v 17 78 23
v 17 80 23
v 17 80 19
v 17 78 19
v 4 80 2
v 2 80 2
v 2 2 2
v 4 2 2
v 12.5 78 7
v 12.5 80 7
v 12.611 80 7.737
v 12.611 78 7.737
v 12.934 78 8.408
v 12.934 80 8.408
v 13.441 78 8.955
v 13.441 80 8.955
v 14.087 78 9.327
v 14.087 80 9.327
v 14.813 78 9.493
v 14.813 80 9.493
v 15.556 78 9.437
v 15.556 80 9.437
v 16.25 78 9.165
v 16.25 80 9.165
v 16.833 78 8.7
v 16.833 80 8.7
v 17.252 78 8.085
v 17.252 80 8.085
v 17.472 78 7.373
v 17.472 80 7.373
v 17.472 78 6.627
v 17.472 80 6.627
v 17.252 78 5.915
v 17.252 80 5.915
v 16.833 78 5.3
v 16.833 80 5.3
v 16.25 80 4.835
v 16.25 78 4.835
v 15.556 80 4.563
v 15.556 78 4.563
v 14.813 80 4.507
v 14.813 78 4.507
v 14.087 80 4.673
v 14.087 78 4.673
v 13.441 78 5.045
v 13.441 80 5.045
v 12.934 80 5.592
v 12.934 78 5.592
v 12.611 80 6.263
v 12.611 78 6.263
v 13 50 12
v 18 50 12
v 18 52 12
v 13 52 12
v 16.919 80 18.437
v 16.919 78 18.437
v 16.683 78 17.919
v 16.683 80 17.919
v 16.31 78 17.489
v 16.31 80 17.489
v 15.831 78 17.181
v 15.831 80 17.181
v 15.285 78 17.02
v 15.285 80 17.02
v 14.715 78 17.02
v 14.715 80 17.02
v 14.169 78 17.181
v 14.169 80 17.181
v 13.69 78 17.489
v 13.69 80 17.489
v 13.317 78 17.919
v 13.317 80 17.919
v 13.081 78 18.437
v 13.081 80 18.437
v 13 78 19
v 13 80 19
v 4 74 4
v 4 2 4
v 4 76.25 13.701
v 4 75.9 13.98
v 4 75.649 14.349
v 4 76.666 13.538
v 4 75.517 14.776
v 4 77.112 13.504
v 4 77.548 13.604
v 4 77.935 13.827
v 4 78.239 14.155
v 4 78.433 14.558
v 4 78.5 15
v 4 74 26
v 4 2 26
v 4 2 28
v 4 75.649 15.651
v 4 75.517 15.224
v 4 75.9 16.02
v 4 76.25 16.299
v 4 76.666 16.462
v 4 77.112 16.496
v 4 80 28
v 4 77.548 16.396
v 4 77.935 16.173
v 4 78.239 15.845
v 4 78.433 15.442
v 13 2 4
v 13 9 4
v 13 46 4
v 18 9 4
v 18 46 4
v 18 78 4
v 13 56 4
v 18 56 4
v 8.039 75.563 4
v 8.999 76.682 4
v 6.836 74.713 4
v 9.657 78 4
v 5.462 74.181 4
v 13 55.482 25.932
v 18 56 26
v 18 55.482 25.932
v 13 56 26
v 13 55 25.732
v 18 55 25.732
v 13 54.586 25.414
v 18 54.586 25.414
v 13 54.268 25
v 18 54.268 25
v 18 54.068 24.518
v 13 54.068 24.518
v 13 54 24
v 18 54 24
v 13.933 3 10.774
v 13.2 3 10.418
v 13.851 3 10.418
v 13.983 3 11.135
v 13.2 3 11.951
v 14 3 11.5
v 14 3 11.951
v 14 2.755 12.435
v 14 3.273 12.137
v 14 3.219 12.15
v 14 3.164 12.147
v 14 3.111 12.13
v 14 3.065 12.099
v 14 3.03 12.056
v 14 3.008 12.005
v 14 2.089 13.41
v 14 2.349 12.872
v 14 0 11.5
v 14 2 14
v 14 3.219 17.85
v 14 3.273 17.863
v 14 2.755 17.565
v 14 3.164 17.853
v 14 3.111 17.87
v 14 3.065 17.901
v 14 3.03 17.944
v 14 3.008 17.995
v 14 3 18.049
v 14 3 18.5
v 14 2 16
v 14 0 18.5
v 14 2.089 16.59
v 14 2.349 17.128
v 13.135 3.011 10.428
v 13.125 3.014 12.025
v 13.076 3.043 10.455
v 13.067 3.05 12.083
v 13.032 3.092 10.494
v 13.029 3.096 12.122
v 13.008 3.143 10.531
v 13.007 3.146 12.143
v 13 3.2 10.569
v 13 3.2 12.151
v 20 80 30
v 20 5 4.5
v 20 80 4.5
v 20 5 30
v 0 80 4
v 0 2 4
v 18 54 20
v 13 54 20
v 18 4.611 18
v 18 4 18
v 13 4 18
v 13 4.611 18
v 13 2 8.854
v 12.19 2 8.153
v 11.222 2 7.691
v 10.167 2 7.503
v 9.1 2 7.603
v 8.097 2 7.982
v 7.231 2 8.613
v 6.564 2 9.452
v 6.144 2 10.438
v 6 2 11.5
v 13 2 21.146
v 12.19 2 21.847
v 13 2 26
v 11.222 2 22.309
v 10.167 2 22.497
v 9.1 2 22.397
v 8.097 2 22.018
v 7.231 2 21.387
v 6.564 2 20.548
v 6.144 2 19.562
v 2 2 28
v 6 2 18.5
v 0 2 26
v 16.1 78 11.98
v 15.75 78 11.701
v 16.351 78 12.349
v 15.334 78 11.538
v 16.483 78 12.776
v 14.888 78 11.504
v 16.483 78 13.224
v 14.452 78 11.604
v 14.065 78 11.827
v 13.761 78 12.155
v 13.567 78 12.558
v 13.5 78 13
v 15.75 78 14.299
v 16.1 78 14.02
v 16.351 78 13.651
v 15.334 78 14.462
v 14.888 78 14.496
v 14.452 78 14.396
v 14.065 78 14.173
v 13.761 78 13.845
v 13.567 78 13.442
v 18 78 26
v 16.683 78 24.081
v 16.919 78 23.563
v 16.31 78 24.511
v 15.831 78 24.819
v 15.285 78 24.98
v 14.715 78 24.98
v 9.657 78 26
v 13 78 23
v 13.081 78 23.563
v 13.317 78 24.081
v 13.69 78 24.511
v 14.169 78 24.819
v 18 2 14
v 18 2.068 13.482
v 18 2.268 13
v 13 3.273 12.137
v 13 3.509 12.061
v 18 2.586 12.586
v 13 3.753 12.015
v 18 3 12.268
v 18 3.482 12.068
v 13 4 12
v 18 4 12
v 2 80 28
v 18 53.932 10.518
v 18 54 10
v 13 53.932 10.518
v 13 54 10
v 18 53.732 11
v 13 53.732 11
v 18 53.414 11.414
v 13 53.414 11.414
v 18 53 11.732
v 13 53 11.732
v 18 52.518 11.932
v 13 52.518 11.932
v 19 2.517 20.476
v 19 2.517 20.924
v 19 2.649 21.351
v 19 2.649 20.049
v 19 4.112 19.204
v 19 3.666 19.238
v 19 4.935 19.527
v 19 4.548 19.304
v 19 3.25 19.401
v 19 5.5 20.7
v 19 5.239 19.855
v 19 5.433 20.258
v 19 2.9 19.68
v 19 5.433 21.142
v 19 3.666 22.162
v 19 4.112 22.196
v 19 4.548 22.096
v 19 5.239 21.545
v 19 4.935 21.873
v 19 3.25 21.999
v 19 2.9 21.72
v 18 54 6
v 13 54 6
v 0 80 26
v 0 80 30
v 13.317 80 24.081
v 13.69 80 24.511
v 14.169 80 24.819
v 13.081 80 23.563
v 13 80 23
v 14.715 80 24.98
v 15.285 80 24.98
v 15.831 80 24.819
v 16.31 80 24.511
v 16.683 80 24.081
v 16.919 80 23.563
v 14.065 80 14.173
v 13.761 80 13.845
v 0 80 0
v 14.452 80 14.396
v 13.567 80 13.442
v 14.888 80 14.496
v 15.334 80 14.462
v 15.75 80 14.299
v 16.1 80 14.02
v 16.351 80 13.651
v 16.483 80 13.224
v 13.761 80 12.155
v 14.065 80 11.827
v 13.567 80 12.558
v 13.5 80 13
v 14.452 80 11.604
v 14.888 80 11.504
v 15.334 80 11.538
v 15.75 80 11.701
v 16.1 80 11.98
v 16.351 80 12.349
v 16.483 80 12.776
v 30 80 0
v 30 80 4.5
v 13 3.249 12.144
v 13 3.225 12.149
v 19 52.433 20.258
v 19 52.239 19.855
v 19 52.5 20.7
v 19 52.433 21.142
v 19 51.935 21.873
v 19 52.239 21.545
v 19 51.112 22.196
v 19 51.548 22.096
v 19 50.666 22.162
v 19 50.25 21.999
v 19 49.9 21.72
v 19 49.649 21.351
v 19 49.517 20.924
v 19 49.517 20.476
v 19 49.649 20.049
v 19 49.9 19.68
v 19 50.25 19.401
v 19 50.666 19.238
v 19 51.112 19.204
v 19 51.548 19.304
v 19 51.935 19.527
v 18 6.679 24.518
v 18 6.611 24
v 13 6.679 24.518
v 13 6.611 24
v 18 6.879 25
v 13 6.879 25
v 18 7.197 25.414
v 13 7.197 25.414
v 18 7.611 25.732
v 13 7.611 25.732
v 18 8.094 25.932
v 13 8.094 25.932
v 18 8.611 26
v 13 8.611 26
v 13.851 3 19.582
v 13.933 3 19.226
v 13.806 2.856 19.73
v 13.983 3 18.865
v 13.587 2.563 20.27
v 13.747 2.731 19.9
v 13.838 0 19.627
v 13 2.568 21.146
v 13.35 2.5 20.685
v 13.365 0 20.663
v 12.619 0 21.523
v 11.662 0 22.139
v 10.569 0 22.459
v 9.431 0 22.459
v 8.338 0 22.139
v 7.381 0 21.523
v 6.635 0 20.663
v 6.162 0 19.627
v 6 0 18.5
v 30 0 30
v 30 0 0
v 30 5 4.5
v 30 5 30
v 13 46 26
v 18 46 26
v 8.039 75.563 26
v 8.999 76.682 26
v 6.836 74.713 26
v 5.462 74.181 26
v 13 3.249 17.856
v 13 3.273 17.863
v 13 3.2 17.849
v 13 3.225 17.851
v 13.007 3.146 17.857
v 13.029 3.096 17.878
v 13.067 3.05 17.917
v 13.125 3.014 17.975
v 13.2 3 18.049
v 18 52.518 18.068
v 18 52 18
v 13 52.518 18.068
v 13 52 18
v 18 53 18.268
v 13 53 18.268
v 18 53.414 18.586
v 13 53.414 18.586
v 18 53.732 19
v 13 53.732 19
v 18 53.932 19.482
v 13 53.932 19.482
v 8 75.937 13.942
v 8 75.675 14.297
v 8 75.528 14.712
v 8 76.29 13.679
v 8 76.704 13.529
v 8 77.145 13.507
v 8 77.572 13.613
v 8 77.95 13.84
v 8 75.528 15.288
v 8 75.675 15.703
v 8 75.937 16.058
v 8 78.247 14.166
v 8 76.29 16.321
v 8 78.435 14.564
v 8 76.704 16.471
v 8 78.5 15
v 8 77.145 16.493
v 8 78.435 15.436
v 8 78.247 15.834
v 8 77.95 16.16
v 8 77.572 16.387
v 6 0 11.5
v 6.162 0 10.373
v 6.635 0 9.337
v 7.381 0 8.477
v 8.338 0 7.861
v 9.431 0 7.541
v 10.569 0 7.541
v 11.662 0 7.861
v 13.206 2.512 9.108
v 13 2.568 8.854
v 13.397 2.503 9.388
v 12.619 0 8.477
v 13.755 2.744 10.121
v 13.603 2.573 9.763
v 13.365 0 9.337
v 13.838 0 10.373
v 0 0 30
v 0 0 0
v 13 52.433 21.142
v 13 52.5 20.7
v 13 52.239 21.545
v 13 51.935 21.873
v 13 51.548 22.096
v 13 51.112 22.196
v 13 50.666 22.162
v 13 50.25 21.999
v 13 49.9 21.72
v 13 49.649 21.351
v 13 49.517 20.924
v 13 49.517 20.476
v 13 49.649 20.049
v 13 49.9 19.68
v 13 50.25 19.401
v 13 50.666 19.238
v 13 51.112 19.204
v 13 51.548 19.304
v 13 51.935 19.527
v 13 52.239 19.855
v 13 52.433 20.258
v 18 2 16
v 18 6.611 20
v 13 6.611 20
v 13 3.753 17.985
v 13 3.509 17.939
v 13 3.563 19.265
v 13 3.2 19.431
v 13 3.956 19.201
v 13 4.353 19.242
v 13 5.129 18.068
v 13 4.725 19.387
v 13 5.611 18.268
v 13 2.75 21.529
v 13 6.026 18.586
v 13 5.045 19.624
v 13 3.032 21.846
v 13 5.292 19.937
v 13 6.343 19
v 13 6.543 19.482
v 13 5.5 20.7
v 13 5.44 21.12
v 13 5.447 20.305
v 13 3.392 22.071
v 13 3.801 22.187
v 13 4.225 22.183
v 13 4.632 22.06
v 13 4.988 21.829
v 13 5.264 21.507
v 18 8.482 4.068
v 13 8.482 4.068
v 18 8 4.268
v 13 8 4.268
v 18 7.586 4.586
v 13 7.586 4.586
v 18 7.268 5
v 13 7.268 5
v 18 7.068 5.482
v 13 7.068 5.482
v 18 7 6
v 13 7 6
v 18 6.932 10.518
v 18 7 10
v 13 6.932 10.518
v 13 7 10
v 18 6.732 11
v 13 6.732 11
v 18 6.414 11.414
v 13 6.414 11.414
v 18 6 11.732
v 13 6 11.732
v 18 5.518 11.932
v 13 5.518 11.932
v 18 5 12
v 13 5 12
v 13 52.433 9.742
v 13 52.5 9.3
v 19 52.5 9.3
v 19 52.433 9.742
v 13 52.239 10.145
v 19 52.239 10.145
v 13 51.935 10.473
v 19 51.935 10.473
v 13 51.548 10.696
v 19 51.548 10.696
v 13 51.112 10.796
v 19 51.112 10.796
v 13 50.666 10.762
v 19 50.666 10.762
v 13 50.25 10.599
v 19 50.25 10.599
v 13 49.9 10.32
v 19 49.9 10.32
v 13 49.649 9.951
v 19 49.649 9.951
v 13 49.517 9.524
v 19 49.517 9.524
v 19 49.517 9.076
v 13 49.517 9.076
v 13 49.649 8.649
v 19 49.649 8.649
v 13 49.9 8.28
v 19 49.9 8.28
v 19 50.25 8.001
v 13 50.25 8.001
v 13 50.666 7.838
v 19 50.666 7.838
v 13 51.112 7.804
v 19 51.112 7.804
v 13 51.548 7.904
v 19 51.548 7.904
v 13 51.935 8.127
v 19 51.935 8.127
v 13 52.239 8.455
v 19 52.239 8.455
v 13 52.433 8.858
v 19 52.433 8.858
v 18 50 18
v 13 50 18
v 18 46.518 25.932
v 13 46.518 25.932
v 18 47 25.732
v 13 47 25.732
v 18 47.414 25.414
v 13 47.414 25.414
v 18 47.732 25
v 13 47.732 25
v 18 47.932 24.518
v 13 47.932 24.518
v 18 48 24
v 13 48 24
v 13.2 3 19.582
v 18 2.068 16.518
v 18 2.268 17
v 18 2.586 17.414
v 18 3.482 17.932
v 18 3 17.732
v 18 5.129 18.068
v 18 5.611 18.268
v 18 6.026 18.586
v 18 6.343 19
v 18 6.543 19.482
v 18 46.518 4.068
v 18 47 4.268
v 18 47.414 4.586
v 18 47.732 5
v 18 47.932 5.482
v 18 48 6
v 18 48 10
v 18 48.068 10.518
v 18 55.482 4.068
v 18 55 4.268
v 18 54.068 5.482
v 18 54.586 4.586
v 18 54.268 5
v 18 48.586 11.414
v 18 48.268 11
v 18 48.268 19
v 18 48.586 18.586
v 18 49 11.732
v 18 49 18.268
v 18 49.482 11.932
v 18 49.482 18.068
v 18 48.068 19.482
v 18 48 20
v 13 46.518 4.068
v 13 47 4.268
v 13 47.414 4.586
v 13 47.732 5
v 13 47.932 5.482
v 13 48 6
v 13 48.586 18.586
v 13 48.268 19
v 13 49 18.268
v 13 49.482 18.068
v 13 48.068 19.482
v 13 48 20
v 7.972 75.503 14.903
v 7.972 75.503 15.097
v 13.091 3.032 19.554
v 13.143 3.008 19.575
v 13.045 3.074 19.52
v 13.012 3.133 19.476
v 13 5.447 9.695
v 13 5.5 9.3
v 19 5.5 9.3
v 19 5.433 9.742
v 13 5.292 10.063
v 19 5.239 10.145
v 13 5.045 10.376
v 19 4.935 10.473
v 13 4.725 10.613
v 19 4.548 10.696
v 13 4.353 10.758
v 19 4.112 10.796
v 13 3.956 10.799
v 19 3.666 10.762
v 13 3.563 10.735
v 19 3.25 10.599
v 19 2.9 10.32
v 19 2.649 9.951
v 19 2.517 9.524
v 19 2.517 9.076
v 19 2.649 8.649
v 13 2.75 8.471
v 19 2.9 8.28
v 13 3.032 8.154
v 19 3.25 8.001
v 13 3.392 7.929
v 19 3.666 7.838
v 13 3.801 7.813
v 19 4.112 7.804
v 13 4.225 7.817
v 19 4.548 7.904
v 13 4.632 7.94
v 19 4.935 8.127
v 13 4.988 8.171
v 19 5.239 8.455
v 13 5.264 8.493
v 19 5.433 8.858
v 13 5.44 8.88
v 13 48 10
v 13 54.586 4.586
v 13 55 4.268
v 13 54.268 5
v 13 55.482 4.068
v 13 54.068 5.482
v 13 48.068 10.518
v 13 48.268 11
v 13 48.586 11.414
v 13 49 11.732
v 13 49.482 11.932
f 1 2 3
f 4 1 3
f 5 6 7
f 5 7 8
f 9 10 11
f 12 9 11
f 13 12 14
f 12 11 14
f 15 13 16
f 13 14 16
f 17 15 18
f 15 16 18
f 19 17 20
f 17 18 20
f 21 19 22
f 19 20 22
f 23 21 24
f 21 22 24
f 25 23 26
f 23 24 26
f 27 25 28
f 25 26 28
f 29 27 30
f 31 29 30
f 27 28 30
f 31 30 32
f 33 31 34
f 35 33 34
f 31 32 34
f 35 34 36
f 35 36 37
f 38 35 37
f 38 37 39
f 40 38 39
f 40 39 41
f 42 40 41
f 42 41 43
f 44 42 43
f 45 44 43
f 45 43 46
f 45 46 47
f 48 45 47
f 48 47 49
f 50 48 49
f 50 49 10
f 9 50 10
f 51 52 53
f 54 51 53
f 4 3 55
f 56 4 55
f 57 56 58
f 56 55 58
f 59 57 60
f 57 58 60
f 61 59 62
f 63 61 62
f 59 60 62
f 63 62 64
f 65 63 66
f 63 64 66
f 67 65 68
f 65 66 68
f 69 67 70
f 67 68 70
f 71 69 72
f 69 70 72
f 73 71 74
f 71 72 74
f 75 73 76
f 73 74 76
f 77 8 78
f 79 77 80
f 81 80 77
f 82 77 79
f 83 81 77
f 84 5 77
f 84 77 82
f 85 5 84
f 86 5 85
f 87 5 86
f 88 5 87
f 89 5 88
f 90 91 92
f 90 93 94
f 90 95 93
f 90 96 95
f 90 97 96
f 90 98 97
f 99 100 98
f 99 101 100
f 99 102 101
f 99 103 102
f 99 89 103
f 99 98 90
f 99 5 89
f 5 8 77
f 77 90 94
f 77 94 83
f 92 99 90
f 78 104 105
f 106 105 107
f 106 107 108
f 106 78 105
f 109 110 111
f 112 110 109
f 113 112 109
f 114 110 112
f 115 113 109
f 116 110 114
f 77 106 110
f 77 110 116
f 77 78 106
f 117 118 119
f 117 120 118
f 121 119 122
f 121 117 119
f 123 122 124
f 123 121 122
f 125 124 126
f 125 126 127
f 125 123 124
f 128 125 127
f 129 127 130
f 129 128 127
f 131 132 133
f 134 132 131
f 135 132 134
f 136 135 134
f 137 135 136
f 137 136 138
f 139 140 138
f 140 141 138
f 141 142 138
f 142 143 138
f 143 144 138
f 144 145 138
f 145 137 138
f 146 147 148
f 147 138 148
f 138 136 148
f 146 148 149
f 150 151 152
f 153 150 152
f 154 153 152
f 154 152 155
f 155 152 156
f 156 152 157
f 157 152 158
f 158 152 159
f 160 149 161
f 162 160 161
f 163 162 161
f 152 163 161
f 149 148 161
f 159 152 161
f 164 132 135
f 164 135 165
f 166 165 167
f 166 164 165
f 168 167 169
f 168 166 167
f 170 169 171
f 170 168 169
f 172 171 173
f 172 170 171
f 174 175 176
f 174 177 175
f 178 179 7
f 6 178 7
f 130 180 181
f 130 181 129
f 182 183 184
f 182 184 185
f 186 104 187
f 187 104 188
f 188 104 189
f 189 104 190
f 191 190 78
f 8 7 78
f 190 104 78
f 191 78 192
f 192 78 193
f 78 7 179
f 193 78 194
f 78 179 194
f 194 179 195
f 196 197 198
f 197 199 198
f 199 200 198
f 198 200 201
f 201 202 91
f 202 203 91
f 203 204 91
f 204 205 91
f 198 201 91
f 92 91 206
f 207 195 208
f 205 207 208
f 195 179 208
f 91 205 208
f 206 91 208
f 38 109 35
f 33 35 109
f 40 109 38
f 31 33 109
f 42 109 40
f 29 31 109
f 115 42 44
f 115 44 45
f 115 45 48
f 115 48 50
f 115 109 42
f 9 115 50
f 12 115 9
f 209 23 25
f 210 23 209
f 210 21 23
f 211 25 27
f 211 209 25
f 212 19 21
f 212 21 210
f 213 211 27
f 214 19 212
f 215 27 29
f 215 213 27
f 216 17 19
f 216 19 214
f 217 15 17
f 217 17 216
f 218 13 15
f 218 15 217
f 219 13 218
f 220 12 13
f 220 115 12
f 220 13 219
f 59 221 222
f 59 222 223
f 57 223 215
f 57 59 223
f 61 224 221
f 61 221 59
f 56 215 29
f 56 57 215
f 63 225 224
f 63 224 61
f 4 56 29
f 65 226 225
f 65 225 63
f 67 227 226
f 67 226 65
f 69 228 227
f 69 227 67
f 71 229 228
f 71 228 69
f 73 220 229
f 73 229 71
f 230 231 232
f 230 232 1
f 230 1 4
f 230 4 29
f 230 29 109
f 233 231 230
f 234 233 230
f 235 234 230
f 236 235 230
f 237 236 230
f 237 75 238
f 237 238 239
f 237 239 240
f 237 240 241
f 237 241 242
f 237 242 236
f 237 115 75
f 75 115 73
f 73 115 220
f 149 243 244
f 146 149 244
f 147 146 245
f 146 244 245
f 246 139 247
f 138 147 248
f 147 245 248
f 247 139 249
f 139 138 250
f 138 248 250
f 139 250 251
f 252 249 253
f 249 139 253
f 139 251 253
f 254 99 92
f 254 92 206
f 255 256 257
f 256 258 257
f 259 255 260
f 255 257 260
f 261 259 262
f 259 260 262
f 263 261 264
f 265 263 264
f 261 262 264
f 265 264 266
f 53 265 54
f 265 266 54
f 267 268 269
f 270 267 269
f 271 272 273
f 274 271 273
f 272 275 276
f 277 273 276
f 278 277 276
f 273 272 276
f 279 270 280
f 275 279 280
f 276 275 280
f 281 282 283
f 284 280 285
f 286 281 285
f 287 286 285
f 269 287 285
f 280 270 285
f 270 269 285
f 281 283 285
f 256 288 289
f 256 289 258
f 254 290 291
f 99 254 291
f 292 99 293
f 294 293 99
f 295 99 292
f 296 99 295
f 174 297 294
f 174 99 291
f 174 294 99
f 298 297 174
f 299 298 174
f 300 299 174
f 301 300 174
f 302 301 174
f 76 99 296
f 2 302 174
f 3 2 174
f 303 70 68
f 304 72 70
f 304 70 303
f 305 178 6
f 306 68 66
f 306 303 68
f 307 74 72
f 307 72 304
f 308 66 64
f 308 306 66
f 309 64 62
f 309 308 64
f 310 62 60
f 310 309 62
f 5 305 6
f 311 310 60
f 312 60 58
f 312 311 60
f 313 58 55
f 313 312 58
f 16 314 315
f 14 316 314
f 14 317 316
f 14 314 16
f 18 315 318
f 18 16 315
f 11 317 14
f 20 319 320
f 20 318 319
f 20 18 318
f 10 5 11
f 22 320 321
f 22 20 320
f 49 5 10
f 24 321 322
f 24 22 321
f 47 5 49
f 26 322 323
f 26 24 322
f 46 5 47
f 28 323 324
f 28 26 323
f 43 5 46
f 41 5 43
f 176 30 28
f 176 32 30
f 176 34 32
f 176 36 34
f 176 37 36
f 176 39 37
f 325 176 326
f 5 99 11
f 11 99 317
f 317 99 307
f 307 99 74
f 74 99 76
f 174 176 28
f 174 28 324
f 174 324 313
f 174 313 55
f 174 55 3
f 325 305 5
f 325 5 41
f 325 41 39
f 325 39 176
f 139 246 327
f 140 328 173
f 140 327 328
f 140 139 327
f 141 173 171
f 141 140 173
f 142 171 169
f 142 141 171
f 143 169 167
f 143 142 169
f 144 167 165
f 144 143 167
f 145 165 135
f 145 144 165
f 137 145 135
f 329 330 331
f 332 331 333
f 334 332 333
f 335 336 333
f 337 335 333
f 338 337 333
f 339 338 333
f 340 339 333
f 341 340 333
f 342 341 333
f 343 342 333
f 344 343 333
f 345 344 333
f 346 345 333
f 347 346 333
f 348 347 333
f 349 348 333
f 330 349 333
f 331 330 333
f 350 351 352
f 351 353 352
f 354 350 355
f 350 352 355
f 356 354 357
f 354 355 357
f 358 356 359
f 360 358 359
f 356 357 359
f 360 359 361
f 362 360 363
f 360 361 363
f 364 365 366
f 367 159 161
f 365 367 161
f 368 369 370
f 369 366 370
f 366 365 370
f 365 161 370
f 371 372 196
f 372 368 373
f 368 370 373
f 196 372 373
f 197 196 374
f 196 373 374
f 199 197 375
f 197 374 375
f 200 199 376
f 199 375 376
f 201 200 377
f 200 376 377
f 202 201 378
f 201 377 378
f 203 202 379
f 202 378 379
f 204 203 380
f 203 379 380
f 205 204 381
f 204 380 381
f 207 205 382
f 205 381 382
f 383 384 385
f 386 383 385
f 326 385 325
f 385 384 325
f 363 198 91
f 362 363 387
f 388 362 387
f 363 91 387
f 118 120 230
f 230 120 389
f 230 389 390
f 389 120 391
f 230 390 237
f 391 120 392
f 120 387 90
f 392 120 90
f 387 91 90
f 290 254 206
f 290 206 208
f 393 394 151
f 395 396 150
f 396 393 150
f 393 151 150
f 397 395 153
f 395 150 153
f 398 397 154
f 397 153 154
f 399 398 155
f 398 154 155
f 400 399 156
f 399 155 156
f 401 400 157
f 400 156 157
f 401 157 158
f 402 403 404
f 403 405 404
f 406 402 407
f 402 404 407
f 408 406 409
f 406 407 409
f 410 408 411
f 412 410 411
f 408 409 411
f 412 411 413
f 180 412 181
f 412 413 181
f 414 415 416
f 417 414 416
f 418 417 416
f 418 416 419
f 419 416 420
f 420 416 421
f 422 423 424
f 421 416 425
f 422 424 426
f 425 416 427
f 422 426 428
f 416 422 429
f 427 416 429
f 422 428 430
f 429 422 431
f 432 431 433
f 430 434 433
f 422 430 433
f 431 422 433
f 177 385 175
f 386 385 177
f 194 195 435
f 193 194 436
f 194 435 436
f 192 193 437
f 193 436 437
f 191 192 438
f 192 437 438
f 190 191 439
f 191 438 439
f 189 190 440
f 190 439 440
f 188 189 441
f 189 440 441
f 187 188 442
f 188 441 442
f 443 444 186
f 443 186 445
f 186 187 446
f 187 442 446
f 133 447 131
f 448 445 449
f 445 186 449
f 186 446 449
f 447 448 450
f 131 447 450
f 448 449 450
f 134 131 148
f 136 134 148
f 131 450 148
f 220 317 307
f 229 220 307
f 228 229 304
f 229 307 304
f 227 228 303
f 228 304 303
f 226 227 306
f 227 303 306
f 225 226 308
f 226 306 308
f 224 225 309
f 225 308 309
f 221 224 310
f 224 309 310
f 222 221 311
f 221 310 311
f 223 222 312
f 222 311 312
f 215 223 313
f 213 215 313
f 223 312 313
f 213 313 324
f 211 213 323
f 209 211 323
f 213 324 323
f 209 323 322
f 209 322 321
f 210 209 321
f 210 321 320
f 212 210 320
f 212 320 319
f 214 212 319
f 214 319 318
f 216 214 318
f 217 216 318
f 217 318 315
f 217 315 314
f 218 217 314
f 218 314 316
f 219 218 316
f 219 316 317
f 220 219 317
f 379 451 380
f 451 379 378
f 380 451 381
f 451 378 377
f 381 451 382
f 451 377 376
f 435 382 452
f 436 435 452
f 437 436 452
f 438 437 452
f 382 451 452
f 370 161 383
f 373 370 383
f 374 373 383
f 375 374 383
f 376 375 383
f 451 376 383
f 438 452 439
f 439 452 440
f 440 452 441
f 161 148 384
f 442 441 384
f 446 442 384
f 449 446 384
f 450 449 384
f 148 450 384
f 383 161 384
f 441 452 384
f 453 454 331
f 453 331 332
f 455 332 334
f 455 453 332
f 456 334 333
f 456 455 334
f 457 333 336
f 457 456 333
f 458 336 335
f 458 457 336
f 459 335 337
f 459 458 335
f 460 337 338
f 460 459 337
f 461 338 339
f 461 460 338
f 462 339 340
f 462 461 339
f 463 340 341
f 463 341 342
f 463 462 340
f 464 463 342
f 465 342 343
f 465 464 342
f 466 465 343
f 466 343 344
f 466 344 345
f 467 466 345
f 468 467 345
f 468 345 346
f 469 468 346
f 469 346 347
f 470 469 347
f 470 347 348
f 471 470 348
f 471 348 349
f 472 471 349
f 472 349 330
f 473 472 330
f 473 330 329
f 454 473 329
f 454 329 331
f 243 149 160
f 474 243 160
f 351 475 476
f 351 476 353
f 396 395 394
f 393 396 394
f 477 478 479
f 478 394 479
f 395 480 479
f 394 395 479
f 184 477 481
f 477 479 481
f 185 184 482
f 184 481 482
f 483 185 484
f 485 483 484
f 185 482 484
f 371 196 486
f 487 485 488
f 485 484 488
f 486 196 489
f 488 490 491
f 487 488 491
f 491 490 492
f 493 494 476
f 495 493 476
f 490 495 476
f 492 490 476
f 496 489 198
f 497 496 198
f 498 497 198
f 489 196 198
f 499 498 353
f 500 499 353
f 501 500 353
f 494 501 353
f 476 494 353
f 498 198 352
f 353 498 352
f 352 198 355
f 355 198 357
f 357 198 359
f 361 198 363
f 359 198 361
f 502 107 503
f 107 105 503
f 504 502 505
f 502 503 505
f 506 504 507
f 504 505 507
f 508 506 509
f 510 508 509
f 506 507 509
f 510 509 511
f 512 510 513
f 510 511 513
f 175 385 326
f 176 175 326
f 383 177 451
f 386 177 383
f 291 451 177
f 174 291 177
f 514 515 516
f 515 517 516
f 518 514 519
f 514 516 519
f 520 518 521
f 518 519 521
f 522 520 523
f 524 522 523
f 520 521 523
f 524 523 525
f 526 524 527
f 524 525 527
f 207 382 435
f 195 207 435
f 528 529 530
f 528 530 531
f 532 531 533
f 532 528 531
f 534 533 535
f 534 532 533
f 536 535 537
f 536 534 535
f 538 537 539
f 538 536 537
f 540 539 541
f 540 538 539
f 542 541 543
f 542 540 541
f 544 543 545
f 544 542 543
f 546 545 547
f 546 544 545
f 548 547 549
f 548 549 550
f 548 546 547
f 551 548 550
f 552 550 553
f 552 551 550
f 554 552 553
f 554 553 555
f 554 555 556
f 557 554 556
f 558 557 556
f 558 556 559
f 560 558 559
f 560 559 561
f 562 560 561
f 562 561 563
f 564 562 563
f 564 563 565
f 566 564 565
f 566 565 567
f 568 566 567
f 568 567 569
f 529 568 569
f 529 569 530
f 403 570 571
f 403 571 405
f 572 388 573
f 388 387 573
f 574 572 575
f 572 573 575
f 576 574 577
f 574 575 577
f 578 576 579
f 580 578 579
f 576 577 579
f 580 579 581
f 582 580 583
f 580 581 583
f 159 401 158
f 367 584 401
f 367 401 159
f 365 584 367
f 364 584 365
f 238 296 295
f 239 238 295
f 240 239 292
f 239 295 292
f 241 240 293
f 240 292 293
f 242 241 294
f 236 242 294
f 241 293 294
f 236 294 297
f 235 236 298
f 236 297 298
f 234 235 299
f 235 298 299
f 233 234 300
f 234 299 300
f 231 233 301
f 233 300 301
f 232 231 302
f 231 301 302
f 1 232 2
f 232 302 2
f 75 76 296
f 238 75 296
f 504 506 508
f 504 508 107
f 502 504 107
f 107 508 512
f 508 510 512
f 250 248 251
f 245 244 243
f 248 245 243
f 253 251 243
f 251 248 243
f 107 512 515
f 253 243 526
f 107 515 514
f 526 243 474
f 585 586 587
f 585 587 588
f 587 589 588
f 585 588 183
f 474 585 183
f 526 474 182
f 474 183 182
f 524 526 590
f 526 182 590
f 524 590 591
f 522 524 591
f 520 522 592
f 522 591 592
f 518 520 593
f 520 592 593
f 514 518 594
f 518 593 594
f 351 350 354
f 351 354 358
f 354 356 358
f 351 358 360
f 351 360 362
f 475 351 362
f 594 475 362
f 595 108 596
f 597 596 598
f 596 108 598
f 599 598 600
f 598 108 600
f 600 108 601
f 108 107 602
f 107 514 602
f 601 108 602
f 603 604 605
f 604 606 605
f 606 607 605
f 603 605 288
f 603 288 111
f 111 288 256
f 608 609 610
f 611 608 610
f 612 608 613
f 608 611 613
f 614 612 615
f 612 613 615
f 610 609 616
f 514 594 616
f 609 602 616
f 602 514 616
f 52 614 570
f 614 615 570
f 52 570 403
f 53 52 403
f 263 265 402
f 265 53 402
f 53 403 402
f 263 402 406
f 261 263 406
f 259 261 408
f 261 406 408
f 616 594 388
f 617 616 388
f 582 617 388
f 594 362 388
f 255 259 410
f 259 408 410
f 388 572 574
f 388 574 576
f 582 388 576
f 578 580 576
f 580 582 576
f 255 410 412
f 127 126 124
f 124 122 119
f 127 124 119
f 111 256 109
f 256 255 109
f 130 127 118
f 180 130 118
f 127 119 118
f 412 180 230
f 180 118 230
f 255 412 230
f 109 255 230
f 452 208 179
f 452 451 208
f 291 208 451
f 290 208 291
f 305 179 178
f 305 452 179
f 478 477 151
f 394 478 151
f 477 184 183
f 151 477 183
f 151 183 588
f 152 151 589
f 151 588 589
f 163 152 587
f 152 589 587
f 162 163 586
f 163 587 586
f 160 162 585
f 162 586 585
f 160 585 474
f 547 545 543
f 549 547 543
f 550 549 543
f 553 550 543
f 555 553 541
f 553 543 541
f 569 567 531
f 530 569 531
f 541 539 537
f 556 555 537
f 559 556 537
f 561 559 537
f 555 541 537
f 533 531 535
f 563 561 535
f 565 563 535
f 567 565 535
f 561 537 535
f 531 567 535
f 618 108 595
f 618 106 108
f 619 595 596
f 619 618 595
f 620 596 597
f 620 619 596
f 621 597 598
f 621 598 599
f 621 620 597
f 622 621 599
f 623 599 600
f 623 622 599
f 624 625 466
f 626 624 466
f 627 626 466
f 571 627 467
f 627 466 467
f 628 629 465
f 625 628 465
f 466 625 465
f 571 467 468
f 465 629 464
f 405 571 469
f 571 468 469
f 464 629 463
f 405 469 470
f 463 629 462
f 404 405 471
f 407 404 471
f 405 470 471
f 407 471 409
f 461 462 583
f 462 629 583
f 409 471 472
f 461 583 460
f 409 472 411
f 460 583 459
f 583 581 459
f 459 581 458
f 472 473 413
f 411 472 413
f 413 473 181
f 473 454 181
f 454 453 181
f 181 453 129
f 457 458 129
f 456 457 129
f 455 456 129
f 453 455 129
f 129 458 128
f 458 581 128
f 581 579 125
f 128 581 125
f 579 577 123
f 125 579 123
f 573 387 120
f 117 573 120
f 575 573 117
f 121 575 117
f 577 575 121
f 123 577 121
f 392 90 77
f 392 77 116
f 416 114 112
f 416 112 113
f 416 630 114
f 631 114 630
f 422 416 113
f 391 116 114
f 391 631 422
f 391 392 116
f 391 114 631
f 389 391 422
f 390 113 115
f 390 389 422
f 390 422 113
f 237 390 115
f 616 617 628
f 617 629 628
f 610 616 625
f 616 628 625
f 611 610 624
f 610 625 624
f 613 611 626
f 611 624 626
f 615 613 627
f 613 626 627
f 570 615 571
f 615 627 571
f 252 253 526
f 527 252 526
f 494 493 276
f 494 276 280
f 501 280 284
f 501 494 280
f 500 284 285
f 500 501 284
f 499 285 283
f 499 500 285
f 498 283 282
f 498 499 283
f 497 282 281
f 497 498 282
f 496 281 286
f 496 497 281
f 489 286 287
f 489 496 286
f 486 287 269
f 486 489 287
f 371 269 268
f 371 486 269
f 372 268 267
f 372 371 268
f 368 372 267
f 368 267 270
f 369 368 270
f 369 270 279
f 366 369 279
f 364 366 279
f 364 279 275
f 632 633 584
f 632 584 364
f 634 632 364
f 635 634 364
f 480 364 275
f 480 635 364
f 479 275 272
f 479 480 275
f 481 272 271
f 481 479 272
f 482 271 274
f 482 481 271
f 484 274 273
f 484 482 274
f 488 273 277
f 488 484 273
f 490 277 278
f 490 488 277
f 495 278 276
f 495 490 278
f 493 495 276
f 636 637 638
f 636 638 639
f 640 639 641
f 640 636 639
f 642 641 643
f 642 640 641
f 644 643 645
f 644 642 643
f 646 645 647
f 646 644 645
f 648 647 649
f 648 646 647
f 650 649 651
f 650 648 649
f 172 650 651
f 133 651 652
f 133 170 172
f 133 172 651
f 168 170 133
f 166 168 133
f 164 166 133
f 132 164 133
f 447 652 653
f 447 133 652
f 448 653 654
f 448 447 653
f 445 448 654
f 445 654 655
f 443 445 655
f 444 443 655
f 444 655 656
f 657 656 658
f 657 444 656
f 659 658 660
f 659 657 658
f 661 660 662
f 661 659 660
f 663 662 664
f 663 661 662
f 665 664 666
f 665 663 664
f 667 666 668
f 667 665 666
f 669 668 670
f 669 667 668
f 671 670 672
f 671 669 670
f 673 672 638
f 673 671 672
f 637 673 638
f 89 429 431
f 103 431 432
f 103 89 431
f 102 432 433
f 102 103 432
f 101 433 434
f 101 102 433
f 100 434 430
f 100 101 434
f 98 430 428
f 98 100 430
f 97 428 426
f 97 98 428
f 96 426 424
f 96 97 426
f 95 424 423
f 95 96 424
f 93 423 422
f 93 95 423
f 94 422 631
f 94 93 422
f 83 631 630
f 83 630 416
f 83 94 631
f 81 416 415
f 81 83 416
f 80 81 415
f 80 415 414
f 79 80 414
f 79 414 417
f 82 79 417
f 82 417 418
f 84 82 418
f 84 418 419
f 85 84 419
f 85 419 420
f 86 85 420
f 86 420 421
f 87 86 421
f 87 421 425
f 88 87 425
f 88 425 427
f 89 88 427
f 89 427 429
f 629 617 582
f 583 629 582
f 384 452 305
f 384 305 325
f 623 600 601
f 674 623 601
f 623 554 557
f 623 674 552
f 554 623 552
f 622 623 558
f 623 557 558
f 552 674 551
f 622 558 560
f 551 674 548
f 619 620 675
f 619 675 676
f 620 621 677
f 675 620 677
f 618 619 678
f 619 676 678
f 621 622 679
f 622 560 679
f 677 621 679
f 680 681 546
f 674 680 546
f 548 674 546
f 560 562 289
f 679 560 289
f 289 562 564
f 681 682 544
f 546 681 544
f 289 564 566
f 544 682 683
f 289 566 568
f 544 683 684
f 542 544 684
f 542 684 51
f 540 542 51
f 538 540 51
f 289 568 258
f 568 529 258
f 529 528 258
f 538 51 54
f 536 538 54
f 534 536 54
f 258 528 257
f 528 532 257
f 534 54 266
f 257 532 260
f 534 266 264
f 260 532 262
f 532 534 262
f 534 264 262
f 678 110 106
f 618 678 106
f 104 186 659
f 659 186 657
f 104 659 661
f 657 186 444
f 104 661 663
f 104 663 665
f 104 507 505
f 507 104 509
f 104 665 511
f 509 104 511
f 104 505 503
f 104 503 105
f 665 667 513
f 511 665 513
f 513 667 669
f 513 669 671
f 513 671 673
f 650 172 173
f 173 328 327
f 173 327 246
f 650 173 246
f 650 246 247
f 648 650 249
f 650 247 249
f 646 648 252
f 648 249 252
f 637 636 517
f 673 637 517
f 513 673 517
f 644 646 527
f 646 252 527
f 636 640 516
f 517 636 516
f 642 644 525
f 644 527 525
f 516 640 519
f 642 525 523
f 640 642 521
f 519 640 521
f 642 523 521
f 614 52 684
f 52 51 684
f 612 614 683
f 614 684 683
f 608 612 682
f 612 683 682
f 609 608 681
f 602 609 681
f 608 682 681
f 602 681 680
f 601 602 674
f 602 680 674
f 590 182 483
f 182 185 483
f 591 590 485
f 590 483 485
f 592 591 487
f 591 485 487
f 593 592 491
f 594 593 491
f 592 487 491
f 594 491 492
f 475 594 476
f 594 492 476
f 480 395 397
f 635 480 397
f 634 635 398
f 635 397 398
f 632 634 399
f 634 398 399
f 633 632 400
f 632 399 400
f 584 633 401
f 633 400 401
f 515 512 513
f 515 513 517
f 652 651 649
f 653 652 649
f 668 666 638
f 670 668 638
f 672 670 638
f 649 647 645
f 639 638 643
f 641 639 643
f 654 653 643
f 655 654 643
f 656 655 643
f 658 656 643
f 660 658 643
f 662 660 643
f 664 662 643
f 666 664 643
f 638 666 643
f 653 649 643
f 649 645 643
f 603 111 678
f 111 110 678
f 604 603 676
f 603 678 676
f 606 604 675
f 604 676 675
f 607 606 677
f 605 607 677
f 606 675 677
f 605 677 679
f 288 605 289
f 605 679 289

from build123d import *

# Parameters (mm, degrees)
BOX_W           = 30
BOX_H           = 80
BOX_DEPTH       = 30
SKETCH_W        = 75
SKETCH_H        = 21
POCKET_DEPTH    = 10
SKETCH001_W     = 76
SKETCH001_H     = 22
POCKET001_DEPTH = 18
POCKET002_DEPTH = 78
SKETCH003_W     = 6
SKETCH003_H     = 8
PAD_DEPTH       = 5
FILLET_R        = 2
POCKET003_DEPTH = 3
FILLET001_R     = 0.2
SKETCH005_R     = 1.5
POCKET004_DEPTH = 19
SKETCH006_R     = 1.5
SKETCH006_R_2   = 2.5
POCKET005_DEPTH = 5
PAD001_DEPTH    = 13
SKETCH008_R     = 1.5
POCKET006_DEPTH = 8
SKETCH009_W     = 75
SKETCH009_H     = 25
POCKET007_DEPTH = 10


with BuildPart() as part:
    # Box → Box (join)
    with BuildSketch(Plane.XY):
        with Locations((15, 40)):
            Rectangle(BOX_W, BOX_H)
    extrude(amount=BOX_DEPTH)

    # Sketch (on Face2 of Box) → Pocket (cut)
    with BuildSketch(Plane.YZ.offset(30)):
        with Locations((42.5, 15)):
            Rectangle(SKETCH_W, SKETCH_H)
    extrude(amount=-POCKET_DEPTH, mode=Mode.SUBTRACT)

    # Sketch001 → Pocket001 (cut)
    with BuildSketch(Plane.YZ):
        with Locations((40, 15)):
            Rectangle(SKETCH001_W, SKETCH001_H)
    extrude(amount=POCKET001_DEPTH, mode=Mode.SUBTRACT)

    # Sketch002 (on Face5 of Pocket001) → Pocket002 (cut)
    with BuildSketch(Plane(origin=(0, 80, 0), x_dir=(-1, 0, 0), z_dir=(0, 1, 0))):
        Polygon((-4, 28), (-2, 28), (0, 26), (5, 26), (5, 4), (0, 4), (-2, 2), (-4, 2), align=None)
    extrude(amount=-POCKET002_DEPTH, mode=Mode.SUBTRACT)

    # Sketch003 → Pad (join)
    with BuildSketch(Plane.YZ.offset(18)):
        with Locations((51, 22)):
            Rectangle(SKETCH003_W, SKETCH003_H)
        with Locations((51, 8)):
            Rectangle(SKETCH003_W, SKETCH003_H)
        with Locations((3.611342, 22)):
            Rectangle(SKETCH003_W, SKETCH003_H)
        with Locations((4, 8)):
            Rectangle(SKETCH003_W, SKETCH003_H)
    extrude(amount=-PAD_DEPTH)

    # Fillet
    fillet_edges = [part.edges().sort_by_distance(p)[0] for p in [
        (15.5, 2, 18),
        (15.5, 2, 12),
        (15.5, 7, 12),
        (15.5, 6.611342, 18),
        (15.5, 48, 12),
        (15.5, 54, 12),
        (15.5, 48, 4),
        (15.5, 54, 4),
        (15.5, 54, 18),
        (15.5, 48, 18),
        (15.5, 48, 26),
        (15.5, 54, 26),
        (15.5, 7, 4),
        (15.5, 6.611342, 26),
    ]]
    fillet(fillet_edges, radius=FILLET_R)

    # Sketch004 (on Face46 of Fillet) → Pocket003 (cut)
    with BuildSketch(Plane.XZ):
        with BuildLine():
            ThreePointArc((14, 18.5), (10, 22.5), (6, 18.5))
            Line((6, 18.5), (6, 11.5))
            ThreePointArc((6, 11.5), (10, 7.5), (14, 11.5))
            Line((14, 11.5), (14, 18.5))
        make_face()
    extrude(amount=-POCKET003_DEPTH, mode=Mode.SUBTRACT)

    # Fillet001
    fillet001_edges = [part.edges().sort_by_distance(p)[0] for p in [
        (13, 3, 19.438901),
        (13.5, 3, 17.732051),
        (13.5, 3, 12.267949),
        (13, 3, 10.561099),
    ]]
    fillet(fillet001_edges, radius=FILLET001_R)

    # Sketch005 → Pocket004 (cut)
    with BuildSketch(Plane.YZ):
        with Locations((4, 9.3)):
            Circle(SKETCH005_R)
        with Locations((4, 20.7)):
            Circle(SKETCH005_R)
        with Locations((51, 9.3)):
            Circle(SKETCH005_R)
        with Locations((51, 20.7)):
            Circle(SKETCH005_R)
    extrude(amount=POCKET004_DEPTH, mode=Mode.SUBTRACT)

    # Sketch006 (on Face58 of Pocket004) → Pocket005 (cut)
    with BuildSketch(Plane(origin=(0, 80, 0), x_dir=(-1, 0, 0), z_dir=(0, 1, 0))):
        with Locations((-15, 13)):
            Circle(SKETCH006_R)
        with Locations((-15, 7)):
            Circle(SKETCH006_R_2)
        with BuildLine():
            ThreePointArc((-13, 23), (-15, 25), (-17, 23))
            Line((-17, 23), (-17, 19))
            ThreePointArc((-17, 19), (-15, 17), (-13, 19))
            Line((-13, 19), (-13, 23))
        make_face()
    extrude(amount=-POCKET005_DEPTH, mode=Mode.SUBTRACT)

    # Sketch007 → Pad001 (join, symmetric)
    with BuildSketch(Plane.XY.offset(15)):
        with BuildLine():
            Line((4, 80), (10, 80))
            ThreePointArc((4, 74), (8.242641, 75.757359), (10, 80))
            Line((4, 80), (4, 74))
        make_face()
    extrude(amount=PAD001_DEPTH, both=True)

    # Sketch008 → Pocket006 (cut)
    with BuildSketch(Plane.YZ):
        with Locations((77, 15)):
            Circle(SKETCH008_R)
    extrude(amount=POCKET006_DEPTH, mode=Mode.SUBTRACT)

    # Sketch009 (on Face49 of Pocket006) → Pocket007 (cut)
    with BuildSketch(Plane.YZ.offset(30)):
        with Locations((42.5, 32.5)):
            Rectangle(SKETCH009_W, SKETCH009_H)
    extrude(amount=-POCKET007_DEPTH, mode=Mode.SUBTRACT)


solid = part.part
